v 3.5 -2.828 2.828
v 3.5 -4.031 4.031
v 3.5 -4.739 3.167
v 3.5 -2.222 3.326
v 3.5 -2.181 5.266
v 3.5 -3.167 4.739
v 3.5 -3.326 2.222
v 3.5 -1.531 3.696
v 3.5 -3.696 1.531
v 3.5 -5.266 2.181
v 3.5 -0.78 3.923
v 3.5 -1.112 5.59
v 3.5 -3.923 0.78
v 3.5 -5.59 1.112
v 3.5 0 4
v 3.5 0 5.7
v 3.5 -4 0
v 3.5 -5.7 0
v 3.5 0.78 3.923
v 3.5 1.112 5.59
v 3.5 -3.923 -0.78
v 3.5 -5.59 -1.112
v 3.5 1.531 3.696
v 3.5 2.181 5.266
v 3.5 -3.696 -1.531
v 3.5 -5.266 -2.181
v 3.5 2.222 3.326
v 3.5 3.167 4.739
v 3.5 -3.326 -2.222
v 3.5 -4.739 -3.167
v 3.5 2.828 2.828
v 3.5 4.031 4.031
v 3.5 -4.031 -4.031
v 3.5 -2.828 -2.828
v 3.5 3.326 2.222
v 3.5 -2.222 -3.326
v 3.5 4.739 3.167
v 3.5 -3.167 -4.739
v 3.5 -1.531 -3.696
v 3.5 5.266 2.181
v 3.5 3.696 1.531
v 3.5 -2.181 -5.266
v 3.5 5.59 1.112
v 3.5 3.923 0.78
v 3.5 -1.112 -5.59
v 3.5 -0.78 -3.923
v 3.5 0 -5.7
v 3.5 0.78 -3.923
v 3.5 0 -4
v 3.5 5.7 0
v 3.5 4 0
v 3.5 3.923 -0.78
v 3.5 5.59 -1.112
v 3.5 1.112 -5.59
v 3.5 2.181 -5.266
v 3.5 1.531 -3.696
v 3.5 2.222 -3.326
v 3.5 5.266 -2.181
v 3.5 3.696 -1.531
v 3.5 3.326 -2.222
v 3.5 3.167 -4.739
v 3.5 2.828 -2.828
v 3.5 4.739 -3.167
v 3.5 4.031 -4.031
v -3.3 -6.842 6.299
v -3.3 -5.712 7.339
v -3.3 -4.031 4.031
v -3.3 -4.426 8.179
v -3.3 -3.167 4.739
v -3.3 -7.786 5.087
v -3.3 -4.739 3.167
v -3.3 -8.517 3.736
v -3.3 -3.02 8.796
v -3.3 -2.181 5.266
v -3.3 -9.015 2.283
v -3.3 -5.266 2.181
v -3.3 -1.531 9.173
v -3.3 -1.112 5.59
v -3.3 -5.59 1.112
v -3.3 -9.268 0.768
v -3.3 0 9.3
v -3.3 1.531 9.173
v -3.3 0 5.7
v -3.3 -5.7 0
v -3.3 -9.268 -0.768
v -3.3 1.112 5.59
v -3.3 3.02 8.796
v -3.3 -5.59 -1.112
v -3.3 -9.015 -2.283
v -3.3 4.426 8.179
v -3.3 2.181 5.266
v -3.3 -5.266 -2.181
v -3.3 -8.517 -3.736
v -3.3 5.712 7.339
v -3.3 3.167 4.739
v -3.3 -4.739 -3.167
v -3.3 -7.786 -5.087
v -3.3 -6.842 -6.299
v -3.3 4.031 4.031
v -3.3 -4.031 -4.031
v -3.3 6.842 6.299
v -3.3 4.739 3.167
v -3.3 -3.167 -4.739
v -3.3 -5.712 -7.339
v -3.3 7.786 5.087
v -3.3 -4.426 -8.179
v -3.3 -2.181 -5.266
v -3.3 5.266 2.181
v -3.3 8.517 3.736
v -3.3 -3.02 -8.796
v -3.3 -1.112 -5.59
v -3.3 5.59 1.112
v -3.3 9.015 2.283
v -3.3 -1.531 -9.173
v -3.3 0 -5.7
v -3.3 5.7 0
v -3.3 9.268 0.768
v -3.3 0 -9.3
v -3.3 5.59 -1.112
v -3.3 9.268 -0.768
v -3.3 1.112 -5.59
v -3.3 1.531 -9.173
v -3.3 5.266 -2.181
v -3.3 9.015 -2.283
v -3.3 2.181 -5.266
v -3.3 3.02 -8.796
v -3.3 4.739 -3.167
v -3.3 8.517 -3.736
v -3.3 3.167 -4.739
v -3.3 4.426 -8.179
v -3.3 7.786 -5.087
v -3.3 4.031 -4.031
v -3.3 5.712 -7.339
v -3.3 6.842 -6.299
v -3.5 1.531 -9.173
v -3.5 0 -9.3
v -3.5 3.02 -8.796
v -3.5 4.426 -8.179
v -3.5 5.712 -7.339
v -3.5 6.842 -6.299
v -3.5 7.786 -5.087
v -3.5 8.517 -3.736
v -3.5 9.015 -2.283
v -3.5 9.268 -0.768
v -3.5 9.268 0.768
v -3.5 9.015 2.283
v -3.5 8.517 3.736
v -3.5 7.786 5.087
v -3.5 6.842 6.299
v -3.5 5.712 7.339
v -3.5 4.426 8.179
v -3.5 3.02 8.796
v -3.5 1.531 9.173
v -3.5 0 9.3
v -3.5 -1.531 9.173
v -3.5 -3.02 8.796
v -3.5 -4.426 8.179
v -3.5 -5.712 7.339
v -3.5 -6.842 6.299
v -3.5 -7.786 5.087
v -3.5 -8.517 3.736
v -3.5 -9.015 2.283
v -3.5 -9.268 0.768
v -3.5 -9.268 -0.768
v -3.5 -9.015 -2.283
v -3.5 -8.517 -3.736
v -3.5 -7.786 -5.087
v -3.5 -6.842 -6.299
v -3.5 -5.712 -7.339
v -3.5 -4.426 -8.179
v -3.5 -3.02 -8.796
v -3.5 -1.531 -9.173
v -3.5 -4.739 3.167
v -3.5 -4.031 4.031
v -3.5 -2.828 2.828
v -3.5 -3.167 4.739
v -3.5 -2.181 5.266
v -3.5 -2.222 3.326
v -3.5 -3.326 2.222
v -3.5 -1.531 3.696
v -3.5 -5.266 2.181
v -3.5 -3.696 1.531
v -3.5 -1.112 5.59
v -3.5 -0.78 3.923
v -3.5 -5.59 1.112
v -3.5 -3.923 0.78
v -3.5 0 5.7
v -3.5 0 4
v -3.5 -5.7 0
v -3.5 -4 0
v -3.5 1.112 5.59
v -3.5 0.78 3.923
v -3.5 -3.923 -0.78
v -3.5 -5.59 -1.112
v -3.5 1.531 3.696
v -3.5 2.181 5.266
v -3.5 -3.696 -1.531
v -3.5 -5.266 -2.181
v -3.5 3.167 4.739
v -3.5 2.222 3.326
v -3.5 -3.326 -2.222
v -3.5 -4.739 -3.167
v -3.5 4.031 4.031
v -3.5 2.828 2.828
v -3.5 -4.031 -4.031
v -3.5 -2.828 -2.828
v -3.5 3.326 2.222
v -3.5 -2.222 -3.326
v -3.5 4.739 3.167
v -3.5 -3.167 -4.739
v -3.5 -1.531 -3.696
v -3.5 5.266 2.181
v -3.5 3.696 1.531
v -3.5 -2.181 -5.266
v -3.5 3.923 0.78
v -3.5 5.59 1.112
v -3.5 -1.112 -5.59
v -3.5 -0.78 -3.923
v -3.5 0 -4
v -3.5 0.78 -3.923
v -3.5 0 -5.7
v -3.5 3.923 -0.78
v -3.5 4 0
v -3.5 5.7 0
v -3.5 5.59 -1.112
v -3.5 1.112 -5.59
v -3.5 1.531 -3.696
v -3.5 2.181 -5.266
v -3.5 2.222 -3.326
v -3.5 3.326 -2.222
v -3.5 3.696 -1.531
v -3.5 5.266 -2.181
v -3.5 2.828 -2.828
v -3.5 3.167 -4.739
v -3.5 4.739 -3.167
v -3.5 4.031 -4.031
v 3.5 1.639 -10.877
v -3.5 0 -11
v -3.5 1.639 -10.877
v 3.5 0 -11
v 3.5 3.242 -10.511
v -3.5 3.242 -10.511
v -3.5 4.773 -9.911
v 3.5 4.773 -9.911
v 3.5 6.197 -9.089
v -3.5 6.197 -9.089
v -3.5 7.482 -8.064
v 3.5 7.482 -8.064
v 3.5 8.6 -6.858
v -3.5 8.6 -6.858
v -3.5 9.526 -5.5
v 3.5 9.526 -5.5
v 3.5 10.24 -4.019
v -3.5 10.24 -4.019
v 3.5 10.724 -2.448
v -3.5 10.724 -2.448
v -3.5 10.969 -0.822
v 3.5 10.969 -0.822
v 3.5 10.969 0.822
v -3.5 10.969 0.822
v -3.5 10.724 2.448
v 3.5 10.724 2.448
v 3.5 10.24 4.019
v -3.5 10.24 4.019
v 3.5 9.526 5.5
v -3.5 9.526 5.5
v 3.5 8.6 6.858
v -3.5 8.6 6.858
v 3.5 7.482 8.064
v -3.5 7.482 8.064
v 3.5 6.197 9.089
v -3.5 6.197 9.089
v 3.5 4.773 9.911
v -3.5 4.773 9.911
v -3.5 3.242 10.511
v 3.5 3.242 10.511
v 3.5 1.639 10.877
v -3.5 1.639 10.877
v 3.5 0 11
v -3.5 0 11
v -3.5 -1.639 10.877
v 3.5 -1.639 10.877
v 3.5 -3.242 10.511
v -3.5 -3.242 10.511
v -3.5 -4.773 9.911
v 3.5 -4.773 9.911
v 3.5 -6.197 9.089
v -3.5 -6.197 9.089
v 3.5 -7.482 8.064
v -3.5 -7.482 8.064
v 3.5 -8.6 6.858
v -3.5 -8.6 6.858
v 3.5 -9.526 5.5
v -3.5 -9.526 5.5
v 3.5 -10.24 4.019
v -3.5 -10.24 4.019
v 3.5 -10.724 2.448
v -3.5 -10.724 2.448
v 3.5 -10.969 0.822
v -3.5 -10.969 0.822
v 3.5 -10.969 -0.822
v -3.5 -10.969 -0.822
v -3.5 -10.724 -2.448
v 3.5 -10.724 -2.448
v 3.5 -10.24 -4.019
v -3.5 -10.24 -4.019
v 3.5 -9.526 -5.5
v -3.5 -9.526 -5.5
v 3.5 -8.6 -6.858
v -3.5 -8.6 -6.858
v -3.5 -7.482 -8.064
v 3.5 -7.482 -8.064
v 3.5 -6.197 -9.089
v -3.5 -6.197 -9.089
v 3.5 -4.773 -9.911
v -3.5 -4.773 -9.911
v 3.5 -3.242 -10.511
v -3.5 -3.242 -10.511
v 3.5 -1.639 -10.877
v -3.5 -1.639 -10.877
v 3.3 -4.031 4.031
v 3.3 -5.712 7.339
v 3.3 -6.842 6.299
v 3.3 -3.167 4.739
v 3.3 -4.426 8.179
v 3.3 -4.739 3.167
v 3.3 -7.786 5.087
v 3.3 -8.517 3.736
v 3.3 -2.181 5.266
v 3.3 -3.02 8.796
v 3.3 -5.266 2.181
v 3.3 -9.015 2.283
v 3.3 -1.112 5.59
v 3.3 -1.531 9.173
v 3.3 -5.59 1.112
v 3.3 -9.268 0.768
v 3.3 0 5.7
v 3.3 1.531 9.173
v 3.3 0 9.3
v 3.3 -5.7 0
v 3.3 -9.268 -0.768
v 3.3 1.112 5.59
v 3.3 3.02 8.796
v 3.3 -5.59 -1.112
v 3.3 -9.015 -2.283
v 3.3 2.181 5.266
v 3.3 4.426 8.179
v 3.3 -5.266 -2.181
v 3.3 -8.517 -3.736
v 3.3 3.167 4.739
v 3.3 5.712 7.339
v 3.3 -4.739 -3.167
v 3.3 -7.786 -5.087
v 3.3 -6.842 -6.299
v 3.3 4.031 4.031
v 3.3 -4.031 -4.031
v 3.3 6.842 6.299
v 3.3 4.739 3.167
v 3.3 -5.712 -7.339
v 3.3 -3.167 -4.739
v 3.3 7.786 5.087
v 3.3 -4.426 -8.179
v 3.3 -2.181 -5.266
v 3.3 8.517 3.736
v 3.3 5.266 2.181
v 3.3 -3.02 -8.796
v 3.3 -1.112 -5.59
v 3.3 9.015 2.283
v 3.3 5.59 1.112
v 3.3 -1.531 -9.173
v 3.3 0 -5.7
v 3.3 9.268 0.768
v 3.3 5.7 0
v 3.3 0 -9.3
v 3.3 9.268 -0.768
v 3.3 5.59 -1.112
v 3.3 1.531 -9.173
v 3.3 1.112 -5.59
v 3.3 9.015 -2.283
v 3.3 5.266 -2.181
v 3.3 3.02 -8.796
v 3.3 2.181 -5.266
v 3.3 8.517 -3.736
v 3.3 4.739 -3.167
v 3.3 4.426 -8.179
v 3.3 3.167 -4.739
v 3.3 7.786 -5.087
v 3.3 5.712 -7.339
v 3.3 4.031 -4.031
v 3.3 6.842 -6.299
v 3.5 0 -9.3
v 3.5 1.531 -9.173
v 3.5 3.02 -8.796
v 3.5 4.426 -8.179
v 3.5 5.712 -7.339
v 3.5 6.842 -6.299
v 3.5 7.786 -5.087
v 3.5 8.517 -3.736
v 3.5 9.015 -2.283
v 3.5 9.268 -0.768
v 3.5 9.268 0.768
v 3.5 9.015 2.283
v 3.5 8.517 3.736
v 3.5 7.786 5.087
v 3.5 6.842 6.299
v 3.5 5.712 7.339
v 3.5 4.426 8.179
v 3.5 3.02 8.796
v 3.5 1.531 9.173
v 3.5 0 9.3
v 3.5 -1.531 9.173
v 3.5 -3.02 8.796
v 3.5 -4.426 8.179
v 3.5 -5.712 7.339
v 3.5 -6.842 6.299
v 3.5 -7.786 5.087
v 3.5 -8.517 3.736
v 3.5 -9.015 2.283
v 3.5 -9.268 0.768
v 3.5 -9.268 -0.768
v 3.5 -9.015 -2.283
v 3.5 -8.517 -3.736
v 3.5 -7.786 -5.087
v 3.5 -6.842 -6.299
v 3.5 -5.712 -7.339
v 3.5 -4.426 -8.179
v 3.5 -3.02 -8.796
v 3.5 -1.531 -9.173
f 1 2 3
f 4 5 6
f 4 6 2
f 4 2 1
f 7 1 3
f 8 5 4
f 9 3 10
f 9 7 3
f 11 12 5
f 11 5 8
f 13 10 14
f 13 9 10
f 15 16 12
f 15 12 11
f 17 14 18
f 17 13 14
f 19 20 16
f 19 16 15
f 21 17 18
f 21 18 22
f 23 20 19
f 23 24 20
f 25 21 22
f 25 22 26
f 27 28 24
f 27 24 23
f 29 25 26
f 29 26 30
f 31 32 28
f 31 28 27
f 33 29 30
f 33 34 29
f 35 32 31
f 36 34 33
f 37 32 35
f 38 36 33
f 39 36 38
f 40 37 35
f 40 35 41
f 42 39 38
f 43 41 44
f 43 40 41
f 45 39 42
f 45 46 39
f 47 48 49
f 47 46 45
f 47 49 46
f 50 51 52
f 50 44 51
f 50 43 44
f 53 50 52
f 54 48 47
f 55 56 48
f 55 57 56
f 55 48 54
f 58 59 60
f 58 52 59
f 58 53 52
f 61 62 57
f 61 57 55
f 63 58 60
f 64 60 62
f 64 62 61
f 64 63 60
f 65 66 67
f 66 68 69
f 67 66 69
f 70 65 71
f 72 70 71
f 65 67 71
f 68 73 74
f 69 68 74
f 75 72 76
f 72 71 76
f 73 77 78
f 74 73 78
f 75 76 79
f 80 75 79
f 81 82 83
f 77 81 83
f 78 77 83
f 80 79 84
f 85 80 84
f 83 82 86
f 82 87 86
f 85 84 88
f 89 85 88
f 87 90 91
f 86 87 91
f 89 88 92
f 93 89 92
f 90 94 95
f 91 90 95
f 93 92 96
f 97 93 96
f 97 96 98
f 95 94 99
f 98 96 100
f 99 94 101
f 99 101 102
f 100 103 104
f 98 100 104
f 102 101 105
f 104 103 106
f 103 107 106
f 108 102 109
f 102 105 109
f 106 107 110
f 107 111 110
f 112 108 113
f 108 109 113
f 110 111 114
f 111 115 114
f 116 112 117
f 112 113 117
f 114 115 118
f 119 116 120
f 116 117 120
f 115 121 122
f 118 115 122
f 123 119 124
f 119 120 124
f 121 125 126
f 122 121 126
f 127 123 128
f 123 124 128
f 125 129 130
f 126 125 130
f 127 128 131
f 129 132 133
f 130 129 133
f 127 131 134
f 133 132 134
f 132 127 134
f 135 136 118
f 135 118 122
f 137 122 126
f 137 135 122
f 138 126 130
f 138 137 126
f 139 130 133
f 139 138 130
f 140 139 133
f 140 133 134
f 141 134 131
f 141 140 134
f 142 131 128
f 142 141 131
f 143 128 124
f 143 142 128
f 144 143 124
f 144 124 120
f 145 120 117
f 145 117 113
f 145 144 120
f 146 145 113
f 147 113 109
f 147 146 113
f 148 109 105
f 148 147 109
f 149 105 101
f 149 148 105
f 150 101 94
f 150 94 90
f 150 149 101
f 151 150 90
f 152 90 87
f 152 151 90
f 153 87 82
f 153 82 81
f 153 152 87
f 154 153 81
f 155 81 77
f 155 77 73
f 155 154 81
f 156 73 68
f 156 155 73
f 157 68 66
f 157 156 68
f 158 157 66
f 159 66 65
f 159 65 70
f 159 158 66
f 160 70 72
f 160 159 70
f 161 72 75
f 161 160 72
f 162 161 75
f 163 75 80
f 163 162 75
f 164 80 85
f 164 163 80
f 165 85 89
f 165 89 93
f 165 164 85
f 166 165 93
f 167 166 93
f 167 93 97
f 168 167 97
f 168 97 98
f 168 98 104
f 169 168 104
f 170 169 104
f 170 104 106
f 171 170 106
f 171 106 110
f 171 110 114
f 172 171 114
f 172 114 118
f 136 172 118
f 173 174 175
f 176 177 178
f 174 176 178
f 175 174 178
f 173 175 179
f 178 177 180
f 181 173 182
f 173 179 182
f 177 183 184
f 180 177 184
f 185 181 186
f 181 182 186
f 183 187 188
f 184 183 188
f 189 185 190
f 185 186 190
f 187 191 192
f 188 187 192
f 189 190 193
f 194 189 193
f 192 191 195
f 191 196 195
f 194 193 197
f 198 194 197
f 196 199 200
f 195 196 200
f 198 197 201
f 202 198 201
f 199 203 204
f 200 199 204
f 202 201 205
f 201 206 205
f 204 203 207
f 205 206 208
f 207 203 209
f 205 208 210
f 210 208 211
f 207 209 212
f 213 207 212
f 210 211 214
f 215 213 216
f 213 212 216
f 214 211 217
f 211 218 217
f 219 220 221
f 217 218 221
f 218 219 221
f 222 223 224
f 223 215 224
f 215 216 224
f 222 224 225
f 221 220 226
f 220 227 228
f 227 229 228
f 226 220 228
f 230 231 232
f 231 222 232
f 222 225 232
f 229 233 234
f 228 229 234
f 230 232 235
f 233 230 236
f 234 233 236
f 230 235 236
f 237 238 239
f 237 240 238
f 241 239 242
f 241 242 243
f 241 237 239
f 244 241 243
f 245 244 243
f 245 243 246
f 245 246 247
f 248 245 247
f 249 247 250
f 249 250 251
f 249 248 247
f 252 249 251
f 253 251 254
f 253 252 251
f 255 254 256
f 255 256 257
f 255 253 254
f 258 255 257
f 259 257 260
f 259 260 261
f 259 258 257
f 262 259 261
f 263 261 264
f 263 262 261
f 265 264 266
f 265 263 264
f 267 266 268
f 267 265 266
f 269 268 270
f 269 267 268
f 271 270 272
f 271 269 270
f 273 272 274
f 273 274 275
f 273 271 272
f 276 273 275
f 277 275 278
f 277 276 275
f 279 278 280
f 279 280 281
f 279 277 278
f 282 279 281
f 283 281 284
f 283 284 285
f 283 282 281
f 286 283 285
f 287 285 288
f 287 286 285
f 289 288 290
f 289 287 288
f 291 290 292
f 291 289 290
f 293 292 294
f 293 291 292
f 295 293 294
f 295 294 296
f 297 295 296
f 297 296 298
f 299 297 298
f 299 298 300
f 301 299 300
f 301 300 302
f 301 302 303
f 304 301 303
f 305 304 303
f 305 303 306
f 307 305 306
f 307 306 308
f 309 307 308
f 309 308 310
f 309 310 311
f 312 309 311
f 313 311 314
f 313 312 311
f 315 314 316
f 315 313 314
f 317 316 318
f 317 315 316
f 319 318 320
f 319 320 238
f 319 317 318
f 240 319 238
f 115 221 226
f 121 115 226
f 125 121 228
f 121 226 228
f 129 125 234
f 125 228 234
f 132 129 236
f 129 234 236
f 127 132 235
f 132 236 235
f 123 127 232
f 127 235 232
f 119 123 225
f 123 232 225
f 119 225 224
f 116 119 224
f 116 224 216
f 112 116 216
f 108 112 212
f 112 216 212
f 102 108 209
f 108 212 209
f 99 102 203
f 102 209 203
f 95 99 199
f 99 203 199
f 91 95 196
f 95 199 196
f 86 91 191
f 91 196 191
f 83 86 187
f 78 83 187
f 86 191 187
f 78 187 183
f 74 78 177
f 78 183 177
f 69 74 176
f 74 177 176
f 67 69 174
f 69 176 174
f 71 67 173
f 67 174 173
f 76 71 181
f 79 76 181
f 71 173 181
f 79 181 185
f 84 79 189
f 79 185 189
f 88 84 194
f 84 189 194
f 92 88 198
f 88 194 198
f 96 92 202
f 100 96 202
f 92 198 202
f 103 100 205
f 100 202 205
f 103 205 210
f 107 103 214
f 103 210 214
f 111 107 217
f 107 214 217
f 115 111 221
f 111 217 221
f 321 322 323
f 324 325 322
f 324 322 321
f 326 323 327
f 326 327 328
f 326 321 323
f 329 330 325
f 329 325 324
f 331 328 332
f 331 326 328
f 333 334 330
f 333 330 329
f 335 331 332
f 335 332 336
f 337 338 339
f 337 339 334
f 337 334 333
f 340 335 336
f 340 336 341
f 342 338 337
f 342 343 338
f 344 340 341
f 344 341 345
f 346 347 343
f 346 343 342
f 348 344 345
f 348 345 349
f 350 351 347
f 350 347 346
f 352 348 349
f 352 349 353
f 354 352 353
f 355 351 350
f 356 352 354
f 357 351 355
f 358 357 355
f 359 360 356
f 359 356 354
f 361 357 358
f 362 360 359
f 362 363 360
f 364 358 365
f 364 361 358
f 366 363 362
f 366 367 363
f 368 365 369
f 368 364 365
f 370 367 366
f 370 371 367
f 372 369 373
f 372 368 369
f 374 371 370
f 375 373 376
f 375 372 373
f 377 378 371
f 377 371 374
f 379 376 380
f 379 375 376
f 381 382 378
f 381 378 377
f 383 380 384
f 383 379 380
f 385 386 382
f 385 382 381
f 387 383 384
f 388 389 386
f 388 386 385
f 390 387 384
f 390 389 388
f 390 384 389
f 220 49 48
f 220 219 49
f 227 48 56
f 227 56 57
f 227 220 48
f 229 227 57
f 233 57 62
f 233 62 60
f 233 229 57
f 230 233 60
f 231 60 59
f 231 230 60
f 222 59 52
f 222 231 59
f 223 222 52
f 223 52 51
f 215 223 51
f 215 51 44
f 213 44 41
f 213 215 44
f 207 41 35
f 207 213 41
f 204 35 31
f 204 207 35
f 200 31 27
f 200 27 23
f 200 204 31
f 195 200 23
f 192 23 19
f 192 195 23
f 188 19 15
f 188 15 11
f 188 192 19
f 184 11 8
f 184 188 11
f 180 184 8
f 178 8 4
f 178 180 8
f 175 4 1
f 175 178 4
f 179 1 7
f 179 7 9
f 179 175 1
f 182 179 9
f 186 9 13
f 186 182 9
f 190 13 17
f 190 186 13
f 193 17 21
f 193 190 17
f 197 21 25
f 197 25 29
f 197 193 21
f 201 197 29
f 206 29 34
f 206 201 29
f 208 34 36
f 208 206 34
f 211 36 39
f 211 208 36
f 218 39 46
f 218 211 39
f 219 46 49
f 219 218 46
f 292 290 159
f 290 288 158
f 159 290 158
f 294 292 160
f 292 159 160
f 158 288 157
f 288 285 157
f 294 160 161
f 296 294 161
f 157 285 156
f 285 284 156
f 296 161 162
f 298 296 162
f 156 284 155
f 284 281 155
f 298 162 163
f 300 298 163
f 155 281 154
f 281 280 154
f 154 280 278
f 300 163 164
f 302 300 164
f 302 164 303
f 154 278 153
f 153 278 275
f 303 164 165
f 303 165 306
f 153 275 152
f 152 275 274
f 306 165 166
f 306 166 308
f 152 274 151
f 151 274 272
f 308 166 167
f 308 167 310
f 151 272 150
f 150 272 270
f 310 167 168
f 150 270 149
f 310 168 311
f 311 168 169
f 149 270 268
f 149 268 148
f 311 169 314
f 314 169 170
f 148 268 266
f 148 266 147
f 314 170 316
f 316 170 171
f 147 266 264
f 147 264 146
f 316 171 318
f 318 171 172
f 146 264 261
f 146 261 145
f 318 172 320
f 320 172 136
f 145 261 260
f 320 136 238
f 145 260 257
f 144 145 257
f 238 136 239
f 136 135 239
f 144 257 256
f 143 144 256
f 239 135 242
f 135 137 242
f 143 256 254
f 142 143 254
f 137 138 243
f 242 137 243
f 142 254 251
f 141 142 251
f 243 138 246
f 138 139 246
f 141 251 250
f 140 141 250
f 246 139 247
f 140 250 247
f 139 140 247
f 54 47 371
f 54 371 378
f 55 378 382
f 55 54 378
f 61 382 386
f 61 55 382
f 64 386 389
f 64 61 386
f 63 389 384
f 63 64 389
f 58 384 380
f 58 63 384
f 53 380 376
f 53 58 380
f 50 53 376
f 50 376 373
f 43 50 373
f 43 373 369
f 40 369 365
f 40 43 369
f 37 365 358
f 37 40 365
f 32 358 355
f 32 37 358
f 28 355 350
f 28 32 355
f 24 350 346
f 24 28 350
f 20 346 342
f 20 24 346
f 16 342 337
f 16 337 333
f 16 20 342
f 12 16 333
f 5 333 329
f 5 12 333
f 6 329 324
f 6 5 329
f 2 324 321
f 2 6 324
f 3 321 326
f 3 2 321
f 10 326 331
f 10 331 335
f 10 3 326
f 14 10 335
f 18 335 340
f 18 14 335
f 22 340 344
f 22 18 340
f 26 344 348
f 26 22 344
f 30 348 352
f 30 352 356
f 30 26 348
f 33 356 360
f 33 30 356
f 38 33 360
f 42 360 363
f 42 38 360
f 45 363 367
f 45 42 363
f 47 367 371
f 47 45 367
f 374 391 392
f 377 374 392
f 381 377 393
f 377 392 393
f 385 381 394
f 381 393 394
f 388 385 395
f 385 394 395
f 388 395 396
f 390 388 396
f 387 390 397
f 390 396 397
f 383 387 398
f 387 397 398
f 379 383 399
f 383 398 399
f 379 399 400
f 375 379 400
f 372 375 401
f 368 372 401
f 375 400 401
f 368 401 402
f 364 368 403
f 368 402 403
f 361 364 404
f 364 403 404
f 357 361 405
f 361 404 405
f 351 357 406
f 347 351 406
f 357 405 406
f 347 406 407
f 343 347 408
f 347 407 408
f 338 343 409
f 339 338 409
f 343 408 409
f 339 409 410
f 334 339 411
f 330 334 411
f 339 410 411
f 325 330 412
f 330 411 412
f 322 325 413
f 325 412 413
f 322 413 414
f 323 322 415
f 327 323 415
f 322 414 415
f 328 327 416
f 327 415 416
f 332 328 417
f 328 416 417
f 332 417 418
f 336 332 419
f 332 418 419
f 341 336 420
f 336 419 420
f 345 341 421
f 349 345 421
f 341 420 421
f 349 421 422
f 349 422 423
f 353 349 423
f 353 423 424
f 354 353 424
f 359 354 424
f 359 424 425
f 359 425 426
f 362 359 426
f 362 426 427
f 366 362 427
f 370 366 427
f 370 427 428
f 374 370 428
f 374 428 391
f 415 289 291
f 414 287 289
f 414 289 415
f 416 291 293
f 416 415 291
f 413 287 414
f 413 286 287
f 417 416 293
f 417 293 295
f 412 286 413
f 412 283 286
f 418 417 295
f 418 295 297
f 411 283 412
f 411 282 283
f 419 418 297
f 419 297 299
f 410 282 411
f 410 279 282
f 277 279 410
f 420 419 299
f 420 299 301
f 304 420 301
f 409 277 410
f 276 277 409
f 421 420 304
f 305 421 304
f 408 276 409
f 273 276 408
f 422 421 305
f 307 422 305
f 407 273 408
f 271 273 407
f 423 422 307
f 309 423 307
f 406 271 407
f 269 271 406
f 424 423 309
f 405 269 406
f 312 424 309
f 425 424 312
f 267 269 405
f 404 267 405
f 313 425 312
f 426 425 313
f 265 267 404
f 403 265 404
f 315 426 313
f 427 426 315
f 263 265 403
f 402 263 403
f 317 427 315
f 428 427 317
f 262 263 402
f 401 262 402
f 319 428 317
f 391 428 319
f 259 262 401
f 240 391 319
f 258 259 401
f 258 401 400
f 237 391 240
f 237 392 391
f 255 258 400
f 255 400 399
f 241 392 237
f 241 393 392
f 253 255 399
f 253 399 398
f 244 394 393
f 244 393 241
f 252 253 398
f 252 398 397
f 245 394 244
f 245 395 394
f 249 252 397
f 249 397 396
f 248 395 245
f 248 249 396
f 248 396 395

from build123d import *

# Parameters (mm, degrees)
ESQUISSE1_R             = 11
ESQUISSE1_R_2           = 4
BOSS_EXTRU_1_DEPTH      = 3.5
ESQUISSE2_R             = 9.3
ESQUISSE2_R_2           = 5.7
ENL_V_MAT_EXTRU_1_DEPTH = 0.2


with BuildPart() as part:
    # Esquisse1 → Boss.-Extru.1 (new, symmetric)
    with BuildSketch(Plane(origin=(0, 0, 0), x_dir=(0, 0, -1), z_dir=(1, 0, 0))):
        Circle(ESQUISSE1_R)
        Circle(ESQUISSE1_R_2, mode=Mode.SUBTRACT)
    extrude(amount=BOSS_EXTRU_1_DEPTH, both=True)

    # Esquisse2 → Enlèv. mat.-Extru.1 (cut)
    with BuildSketch(Plane(origin=(3.5, 0, 0), x_dir=(0, 0, -1), z_dir=(1, 0, 0))):
        Circle(ESQUISSE2_R)
        Circle(ESQUISSE2_R_2, mode=Mode.SUBTRACT)
    enl_v_mat_extru_1 = extrude(amount=-ENL_V_MAT_EXTRU_1_DEPTH, mode=Mode.SUBTRACT)

    # Symétrie1: Enlèv. mat.-Extru.1 across plane
    add(enl_v_mat_extru_1.mirror(Plane(origin=(0, 0, 0), x_dir=(0, 0, 1), z_dir=(1, 0, 0))), mode=Mode.SUBTRACT)


solid = part.part
